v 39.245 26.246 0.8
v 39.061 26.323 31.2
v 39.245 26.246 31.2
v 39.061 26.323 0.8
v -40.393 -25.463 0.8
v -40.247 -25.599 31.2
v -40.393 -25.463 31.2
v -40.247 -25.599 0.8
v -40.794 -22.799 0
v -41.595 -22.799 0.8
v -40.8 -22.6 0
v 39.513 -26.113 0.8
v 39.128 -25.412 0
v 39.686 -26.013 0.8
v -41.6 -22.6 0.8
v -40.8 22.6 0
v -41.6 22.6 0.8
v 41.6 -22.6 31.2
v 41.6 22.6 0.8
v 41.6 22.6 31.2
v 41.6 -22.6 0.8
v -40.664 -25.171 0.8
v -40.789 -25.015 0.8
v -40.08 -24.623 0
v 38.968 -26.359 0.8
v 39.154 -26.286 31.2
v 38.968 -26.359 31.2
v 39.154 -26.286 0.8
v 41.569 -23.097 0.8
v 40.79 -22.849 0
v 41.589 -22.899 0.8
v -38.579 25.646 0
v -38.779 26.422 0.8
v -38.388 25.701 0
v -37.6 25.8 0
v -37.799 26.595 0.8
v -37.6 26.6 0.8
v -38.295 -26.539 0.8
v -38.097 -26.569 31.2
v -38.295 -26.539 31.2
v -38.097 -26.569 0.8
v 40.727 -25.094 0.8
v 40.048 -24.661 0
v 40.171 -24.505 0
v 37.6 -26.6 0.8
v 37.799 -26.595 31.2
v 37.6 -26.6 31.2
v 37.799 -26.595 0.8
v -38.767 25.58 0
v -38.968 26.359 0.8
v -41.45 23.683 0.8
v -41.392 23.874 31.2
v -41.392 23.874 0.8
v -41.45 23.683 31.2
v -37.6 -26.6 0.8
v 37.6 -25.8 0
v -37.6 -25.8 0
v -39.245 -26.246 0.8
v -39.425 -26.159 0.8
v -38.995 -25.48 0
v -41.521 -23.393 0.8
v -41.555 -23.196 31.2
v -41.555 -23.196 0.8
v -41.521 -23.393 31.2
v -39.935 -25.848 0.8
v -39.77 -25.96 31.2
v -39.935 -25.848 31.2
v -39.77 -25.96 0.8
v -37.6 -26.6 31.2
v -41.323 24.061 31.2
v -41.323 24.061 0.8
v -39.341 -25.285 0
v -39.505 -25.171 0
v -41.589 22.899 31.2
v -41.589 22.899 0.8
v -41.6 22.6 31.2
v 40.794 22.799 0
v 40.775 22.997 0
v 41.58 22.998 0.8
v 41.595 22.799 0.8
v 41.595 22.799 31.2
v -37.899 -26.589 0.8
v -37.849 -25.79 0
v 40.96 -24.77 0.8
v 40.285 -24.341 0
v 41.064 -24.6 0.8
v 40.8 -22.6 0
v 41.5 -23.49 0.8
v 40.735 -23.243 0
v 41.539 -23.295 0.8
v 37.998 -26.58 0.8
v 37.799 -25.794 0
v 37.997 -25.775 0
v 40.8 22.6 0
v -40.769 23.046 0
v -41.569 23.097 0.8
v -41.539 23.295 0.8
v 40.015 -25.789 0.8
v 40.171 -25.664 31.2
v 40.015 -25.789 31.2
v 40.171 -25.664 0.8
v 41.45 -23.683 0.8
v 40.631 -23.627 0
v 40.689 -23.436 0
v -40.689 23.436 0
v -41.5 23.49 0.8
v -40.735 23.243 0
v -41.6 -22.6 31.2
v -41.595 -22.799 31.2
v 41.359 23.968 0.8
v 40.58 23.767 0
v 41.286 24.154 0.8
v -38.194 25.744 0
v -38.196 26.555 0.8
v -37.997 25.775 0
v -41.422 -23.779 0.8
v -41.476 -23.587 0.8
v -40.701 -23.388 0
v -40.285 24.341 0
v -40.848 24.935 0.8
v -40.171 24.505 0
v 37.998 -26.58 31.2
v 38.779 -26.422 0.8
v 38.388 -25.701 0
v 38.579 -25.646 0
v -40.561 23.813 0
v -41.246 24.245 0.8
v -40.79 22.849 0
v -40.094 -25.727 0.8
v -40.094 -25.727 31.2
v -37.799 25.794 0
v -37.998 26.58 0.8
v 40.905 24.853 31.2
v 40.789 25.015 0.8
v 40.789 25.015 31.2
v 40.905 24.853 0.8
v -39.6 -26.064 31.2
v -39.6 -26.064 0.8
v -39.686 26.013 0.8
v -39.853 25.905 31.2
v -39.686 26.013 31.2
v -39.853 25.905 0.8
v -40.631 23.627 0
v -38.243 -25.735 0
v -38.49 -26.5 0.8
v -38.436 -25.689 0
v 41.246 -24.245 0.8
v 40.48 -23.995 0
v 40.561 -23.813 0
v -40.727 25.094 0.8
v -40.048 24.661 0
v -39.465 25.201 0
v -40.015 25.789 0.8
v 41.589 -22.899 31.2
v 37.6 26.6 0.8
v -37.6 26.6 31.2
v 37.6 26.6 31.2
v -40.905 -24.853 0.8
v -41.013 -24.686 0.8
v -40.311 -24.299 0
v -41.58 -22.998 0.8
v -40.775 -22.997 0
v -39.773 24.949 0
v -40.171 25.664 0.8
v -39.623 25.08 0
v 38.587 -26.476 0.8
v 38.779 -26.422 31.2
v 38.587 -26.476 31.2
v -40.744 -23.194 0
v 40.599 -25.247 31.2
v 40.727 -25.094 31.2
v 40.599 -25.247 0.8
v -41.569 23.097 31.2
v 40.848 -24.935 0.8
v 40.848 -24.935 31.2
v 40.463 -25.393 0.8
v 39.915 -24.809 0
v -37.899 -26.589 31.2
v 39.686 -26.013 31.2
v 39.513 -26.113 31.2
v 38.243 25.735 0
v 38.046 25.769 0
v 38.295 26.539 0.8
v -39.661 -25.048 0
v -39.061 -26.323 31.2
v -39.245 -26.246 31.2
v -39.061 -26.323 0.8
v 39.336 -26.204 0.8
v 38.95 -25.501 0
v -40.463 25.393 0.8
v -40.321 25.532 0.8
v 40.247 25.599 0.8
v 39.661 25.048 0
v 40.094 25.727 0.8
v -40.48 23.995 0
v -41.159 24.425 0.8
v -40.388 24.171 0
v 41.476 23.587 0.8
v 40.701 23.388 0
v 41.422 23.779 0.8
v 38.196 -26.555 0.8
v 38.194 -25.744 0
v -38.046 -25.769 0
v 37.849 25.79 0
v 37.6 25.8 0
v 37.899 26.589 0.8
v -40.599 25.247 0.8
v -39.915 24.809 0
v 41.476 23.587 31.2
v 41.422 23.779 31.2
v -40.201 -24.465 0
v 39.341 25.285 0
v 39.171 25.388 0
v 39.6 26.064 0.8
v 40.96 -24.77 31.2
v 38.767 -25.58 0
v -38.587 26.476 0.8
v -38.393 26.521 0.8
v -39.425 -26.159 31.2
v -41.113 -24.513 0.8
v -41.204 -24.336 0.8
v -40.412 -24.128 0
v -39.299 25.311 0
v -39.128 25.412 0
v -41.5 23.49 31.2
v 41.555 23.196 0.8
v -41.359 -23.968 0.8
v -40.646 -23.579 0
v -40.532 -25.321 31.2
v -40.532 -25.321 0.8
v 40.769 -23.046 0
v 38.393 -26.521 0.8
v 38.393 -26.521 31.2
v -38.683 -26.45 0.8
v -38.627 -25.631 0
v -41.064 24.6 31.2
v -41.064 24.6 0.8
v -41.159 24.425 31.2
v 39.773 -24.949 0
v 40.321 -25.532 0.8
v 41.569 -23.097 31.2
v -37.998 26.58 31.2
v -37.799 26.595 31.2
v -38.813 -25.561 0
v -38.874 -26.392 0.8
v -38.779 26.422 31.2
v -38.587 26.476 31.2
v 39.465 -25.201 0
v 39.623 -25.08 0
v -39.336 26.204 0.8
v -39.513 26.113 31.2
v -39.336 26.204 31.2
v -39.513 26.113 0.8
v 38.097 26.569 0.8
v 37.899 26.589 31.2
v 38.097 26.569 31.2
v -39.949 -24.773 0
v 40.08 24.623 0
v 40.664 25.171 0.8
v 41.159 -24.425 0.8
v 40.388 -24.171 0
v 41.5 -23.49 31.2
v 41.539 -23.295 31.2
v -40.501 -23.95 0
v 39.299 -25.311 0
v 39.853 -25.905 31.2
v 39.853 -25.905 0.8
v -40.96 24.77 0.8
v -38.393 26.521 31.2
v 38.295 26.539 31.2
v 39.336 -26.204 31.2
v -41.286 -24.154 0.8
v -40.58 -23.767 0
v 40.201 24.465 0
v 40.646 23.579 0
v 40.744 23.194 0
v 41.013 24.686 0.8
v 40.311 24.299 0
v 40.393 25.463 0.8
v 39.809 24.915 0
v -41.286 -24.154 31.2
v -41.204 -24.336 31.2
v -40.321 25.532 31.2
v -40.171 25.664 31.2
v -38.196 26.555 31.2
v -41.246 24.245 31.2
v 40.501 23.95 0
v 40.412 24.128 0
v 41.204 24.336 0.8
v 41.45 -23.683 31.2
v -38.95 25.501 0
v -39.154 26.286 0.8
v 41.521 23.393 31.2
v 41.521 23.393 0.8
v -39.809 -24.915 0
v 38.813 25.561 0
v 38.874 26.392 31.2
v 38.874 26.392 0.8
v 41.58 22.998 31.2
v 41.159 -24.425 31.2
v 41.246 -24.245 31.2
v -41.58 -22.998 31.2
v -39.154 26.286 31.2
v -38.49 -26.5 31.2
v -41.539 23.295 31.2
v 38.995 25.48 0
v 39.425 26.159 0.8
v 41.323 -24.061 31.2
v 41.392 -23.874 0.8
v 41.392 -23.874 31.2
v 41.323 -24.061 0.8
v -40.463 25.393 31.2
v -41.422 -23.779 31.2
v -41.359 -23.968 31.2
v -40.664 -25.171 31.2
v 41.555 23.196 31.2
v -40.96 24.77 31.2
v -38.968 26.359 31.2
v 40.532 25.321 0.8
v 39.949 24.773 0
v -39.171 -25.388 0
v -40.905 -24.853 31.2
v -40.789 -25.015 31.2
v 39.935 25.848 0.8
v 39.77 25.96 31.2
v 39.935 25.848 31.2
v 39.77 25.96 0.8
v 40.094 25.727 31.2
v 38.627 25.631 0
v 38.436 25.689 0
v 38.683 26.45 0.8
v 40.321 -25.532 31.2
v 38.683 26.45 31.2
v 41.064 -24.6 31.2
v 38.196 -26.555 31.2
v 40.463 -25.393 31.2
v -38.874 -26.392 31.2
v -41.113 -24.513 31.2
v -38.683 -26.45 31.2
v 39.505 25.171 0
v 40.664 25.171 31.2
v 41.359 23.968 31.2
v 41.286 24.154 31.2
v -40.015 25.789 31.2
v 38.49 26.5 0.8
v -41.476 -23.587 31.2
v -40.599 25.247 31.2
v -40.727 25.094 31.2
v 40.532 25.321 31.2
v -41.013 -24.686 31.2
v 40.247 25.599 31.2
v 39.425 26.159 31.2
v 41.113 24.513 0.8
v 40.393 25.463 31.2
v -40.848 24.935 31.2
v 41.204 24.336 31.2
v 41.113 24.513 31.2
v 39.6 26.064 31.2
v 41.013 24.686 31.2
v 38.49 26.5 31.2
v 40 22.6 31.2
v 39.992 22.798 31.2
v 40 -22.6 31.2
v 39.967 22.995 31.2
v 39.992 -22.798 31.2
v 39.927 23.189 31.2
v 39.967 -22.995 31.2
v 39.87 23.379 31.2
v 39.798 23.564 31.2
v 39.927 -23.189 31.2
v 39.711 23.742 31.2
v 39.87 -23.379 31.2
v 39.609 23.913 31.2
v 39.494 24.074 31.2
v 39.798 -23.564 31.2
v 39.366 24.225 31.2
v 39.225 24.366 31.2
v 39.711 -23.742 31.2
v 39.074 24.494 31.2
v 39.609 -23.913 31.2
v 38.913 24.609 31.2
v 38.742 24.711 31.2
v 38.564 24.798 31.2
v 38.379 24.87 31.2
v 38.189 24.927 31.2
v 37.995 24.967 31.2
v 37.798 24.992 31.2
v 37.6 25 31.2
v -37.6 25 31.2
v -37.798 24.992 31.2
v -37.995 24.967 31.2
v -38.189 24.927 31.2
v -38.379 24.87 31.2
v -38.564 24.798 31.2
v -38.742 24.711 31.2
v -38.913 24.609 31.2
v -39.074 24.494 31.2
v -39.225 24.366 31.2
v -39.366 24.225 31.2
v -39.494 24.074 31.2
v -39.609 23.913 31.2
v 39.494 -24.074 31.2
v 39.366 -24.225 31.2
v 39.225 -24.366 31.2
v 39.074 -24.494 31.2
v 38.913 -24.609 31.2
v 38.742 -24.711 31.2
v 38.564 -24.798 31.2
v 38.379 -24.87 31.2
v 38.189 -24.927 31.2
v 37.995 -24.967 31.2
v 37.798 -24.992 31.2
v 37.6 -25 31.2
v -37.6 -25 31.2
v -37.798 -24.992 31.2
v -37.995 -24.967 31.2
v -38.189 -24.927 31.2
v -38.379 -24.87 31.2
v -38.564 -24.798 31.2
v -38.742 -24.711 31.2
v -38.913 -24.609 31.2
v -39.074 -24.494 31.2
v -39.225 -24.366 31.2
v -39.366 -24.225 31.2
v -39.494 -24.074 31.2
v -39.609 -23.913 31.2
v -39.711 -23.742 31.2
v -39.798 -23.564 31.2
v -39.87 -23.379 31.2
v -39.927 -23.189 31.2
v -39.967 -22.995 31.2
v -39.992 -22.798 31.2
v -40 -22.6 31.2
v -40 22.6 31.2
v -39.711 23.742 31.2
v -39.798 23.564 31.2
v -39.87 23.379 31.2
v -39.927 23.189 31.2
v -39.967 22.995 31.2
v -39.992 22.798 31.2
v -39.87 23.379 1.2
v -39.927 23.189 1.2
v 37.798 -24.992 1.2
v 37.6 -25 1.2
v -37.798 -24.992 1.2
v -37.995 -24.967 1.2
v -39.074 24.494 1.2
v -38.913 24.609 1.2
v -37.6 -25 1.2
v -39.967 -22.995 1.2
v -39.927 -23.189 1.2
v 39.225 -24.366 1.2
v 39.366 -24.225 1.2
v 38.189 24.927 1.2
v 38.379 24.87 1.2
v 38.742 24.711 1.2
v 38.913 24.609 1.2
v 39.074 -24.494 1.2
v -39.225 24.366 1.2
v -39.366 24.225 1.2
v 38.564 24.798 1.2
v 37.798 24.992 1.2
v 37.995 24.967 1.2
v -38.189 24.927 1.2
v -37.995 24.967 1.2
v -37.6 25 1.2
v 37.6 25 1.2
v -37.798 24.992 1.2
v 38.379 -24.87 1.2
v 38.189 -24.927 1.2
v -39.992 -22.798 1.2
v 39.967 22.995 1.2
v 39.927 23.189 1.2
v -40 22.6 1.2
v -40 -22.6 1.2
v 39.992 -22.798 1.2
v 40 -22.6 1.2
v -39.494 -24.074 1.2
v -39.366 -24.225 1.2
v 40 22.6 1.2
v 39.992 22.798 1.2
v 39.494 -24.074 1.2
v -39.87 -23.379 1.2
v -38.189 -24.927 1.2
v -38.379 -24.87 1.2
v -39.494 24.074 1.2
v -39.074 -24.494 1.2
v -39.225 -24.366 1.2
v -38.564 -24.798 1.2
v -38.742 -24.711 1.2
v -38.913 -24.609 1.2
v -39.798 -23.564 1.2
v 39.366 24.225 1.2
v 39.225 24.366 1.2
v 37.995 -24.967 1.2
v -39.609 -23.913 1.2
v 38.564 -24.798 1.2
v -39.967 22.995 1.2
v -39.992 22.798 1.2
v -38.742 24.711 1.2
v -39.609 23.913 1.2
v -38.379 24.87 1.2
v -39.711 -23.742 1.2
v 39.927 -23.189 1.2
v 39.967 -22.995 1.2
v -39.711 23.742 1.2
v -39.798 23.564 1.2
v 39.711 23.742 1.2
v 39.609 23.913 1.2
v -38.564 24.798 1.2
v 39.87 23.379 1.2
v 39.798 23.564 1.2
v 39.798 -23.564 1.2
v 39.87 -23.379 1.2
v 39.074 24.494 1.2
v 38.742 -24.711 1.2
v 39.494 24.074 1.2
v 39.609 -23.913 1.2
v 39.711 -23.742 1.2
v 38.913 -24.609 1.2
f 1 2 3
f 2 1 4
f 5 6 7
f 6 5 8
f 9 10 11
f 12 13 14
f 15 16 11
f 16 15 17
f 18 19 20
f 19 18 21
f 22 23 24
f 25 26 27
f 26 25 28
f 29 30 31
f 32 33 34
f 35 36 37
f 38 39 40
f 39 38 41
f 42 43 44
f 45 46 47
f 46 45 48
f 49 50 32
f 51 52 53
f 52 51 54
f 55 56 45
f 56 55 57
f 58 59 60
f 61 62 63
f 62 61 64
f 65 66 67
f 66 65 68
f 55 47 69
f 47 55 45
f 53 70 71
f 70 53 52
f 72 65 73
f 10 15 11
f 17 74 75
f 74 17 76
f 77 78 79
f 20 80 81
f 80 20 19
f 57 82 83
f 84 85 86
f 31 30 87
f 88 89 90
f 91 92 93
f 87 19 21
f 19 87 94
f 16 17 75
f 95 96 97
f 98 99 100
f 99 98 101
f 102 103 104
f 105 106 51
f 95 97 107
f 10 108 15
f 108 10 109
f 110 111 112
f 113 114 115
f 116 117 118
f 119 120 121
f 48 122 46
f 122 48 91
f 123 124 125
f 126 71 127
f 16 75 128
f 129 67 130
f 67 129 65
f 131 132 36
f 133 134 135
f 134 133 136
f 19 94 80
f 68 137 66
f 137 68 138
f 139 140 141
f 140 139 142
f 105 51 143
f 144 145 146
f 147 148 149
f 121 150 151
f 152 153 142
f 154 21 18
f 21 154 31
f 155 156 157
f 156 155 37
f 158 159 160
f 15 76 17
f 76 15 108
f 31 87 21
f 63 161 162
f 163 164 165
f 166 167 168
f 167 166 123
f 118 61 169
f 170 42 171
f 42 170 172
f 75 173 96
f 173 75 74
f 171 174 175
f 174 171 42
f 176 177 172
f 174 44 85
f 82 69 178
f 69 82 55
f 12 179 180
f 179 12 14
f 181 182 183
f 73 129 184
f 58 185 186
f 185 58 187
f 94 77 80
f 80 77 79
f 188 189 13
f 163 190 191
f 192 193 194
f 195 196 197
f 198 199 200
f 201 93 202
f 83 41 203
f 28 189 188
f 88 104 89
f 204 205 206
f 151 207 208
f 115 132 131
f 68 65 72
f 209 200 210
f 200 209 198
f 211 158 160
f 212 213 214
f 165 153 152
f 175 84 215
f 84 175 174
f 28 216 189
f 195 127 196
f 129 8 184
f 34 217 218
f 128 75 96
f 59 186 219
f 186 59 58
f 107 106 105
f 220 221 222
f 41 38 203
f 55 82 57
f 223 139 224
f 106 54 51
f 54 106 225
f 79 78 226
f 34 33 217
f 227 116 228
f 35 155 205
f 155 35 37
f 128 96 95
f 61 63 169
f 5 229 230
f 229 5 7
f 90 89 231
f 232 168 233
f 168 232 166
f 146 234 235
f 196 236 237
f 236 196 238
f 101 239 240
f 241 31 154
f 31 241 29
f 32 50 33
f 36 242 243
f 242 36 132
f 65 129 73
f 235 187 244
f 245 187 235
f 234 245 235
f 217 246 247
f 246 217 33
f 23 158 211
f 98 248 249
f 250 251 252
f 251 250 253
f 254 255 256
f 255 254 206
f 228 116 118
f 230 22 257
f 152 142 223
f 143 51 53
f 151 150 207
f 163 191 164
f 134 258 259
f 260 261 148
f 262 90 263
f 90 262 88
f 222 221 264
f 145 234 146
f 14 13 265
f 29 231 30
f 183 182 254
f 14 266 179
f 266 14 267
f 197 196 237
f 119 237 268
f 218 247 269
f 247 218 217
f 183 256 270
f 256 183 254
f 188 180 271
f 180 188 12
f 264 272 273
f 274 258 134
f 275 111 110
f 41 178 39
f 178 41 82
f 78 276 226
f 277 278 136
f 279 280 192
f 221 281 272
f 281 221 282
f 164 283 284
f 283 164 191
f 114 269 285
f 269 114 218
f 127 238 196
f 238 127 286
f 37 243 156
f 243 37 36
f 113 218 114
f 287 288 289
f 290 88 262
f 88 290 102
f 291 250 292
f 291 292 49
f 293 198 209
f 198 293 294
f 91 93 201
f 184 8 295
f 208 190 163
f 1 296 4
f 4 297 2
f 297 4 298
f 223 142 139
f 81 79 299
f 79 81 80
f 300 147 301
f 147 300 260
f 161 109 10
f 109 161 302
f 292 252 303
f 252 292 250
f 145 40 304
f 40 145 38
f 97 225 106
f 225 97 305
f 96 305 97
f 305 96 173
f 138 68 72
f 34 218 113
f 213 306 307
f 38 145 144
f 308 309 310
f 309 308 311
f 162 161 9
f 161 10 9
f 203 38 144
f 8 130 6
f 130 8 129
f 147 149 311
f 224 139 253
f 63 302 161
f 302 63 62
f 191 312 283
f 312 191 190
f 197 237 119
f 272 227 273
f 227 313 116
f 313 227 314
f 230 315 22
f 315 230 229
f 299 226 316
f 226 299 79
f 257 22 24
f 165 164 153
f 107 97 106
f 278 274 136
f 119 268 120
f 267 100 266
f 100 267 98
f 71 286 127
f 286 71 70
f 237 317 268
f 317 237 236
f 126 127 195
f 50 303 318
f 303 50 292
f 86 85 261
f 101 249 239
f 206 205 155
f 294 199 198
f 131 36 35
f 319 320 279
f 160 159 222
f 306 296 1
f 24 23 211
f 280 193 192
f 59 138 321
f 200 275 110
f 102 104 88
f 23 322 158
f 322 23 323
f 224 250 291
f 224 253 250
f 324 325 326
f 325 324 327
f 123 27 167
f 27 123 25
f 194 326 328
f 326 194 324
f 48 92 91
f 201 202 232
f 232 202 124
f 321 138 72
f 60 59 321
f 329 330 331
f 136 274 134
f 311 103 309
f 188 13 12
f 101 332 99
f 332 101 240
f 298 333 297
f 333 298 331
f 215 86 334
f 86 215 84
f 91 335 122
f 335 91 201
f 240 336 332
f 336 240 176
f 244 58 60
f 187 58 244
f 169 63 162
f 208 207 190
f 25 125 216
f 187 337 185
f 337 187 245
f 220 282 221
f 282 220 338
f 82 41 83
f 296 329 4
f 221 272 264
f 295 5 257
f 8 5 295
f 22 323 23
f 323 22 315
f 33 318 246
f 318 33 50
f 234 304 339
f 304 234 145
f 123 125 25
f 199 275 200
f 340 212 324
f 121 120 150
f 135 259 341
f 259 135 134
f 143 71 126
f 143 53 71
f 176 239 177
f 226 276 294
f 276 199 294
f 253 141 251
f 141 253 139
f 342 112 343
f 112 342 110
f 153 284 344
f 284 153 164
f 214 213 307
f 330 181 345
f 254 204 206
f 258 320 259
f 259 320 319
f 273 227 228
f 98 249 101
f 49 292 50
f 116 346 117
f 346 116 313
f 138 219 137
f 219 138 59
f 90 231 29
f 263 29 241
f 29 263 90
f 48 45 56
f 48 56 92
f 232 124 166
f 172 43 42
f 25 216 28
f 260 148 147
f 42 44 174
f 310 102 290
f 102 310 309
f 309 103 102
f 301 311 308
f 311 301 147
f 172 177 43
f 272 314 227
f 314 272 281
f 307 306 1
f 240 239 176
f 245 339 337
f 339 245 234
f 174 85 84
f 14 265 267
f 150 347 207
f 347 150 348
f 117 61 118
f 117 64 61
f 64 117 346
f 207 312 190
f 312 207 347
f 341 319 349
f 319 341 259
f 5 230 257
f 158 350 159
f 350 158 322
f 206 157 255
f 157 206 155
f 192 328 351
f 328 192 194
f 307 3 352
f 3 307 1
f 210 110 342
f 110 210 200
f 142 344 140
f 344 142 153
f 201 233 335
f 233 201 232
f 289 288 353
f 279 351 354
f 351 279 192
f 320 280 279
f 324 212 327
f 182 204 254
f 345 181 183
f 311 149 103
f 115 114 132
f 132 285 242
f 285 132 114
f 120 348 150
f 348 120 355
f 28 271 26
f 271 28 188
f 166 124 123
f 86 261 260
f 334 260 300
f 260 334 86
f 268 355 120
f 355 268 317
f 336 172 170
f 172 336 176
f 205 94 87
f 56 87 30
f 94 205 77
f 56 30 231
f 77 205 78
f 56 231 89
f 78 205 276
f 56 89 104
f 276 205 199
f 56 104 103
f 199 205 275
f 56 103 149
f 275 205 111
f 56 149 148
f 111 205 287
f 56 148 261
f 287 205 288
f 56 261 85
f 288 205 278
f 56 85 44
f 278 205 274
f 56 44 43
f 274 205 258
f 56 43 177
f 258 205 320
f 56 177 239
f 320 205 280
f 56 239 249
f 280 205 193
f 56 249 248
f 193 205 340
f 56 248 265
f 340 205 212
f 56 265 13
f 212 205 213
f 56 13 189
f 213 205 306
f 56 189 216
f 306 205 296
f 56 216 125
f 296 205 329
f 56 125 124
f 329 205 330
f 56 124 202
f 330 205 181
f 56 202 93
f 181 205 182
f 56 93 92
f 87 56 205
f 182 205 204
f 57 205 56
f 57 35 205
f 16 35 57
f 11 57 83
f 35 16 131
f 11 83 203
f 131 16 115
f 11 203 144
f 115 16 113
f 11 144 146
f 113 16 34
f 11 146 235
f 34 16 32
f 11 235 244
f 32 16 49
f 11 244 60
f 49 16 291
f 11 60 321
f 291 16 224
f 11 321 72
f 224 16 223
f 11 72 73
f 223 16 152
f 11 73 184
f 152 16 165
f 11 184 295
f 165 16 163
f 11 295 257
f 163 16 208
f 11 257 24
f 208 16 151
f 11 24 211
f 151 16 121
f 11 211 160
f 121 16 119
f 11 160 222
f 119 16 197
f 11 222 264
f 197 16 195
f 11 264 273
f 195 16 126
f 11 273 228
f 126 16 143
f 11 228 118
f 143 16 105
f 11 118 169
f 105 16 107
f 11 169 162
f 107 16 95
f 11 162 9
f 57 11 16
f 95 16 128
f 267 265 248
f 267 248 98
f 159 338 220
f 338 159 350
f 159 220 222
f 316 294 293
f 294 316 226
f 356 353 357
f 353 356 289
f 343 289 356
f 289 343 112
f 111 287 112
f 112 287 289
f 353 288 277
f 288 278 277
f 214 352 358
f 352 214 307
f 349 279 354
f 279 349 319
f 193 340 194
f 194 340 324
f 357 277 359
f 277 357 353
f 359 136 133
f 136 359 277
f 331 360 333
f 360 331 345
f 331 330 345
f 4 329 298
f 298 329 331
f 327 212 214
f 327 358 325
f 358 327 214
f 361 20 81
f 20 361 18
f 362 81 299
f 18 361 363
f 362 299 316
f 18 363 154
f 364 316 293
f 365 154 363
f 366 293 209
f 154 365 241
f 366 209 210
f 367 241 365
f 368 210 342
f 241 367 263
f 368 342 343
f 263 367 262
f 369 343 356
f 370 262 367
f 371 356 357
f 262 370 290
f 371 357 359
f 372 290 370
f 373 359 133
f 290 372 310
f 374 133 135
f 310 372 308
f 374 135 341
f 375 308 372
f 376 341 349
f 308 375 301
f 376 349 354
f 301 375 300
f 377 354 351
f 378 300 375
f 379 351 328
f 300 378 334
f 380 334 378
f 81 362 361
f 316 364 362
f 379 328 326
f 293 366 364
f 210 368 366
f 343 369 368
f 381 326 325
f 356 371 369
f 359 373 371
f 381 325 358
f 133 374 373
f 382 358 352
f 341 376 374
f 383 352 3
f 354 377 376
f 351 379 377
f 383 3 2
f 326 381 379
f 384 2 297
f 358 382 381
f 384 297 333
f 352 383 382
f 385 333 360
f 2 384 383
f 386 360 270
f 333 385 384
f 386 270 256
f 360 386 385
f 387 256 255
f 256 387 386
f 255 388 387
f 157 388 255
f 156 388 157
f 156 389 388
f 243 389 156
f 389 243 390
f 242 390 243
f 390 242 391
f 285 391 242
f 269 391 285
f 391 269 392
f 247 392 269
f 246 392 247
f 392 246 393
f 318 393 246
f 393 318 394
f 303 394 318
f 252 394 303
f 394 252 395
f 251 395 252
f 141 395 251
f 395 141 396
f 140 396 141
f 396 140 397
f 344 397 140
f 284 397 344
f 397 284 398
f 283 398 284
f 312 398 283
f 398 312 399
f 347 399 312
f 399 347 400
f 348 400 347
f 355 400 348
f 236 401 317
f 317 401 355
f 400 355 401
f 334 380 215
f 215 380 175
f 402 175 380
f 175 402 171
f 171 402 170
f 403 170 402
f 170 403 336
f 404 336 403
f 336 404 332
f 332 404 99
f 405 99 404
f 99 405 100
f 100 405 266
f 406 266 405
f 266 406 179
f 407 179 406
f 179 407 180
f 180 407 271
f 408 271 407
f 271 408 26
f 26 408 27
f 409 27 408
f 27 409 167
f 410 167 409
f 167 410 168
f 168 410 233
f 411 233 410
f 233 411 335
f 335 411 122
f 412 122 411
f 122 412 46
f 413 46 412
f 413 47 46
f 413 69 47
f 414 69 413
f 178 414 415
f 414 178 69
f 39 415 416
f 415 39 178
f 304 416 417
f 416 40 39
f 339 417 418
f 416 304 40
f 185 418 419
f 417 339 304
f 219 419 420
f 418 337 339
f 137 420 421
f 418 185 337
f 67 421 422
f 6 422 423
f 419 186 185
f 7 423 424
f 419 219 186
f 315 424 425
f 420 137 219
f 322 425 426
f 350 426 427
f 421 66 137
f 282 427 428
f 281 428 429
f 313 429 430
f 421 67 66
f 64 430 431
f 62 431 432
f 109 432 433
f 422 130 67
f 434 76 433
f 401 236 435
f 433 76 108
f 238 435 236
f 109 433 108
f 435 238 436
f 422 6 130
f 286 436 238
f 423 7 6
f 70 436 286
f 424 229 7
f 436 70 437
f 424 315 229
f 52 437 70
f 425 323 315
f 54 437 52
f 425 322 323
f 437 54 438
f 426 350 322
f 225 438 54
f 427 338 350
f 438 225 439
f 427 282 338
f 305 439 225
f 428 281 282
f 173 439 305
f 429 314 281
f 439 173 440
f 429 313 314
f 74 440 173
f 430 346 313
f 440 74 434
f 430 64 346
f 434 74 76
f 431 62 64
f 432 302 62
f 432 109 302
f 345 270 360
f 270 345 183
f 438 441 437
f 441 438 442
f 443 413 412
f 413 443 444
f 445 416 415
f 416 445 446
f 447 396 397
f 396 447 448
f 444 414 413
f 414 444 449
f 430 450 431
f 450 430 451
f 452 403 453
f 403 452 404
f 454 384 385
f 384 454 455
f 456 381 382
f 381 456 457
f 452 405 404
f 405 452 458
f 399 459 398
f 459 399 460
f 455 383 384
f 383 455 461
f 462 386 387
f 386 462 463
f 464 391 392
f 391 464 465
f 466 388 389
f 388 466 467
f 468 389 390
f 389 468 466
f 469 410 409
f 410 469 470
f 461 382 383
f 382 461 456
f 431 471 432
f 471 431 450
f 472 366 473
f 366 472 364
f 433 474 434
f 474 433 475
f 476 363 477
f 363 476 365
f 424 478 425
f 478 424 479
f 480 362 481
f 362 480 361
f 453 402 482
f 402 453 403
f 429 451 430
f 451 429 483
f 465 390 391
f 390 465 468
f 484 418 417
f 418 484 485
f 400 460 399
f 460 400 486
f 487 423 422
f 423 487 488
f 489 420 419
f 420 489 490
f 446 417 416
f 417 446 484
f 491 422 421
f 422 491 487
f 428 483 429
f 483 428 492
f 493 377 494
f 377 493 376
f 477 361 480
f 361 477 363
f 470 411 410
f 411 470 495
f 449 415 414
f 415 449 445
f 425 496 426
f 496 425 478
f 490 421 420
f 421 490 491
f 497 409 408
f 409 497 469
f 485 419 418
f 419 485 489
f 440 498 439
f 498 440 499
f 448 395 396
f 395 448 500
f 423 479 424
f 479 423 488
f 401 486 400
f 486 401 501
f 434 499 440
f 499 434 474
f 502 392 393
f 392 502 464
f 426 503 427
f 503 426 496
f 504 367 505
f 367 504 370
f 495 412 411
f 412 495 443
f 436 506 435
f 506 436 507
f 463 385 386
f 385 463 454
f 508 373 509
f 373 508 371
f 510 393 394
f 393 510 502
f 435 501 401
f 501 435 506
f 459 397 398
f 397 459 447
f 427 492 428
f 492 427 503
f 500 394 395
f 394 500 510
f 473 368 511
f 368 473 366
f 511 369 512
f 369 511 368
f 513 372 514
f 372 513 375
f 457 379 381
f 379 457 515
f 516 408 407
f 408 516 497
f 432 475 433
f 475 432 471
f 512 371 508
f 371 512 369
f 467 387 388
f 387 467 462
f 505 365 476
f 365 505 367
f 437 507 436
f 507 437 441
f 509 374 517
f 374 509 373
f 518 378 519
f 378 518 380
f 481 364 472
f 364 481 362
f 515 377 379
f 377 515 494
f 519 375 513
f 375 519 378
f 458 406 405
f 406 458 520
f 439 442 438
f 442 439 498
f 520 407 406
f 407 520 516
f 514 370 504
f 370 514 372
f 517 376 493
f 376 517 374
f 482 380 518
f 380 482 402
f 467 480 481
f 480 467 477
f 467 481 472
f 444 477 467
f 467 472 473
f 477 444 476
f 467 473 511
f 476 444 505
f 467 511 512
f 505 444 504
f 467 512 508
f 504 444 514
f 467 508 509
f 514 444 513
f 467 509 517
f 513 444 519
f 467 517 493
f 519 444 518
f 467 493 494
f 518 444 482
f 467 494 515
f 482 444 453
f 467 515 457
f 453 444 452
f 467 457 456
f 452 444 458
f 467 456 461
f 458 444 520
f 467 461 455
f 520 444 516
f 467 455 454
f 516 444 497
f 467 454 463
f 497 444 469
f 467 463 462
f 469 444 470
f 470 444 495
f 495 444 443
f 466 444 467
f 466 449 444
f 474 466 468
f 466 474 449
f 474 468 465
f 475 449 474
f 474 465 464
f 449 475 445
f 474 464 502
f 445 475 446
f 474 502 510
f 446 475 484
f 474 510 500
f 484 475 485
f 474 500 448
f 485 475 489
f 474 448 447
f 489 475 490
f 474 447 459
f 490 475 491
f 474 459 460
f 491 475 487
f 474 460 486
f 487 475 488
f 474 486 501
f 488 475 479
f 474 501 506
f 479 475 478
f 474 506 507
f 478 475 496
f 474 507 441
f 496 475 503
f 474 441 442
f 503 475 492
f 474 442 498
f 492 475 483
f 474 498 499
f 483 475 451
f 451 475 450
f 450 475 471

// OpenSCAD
// file: ../lib/profiles.scad
// Shared 2D outlines and prisms. Every module takes its dimensions as
// named arguments — nothing in here reads params.scad, because a `use`d
// file's own includes do NOT see the caller's -D overrides. The caller
// (a part file) includes params.scad and passes the numbers in.

eps = 0.01;

// Rounded rectangle, centred. The double offset rounds convex corners.
module rounded_rect(size = [10, 10], r = 1) {
    rr = max(r, 0);
    offset(r = rr) offset(delta = -rr) square(size, center = true);
}

// Rounded prism, z = 0 on the bed, with a 45° chamfer on the bed edge
// (self-supporting, unlike a downward fillet, and it eats elephant foot).
module chamfered_prism(size = [10, 10], r = 1, h = 10, chamfer = 0.8) {
    c = min(chamfer, h / 2);
    hull() {
        linear_extrude(eps) rounded_rect(size = size - [2*c, 2*c], r = r - c);
        translate([0, 0, c]) linear_extrude(h - c) rounded_rect(size = size, r = r);
    }
}

// Self-test: opening this file directly shows a demo; importers see nothing.
if ($preview && $parent_modules == 0) chamfered_prism(size = [40, 25], r = 5, h = 12);
// file: ../params.scad
// <Project name> — one line on what this is and who/what it is for.
// Single source of truth. Units: mm. Measure once, edit this file, `make`.
//
// Frame of reference (every part): z = 0 on the print bed, XY centred.
// Provenance on every real-world number: MEASURED / PLACEHOLDER / UNVERIFIED.

$fa = $preview ? 12 : 2;     // coarse preview, fine render
$fs = $preview ? 2.0 : 0.2;
eps = 0.01;                  // boolean-overlap fudge: every cutter overshoots by this

/* [Printer — EDIT FOR YOUR MACHINE] */
BED_X = 220; BED_Y = 220; BED_Z = 250;   // ⚠ PLACEHOLDER — your build volume
nozzle  = 0.4;
layer_h = 0.2;

/* [Tray interior — MEASURE THESE] */
inner_w = 80;    // ⚠ PLACEHOLDER — the thing that has to fit inside
inner_d = 50;    // ⚠ PLACEHOLDER
inner_h = 30;    // ⚠ PLACEHOLDER
wall    = 1.6;   // 4 perimeters; tune stiffness here first
floor_t = 1.2;   // 6 layers
corner_r = 4;    // vertical-edge radius; the lid derives its own from this
bottom_chamfer = 0.8;   // 45°, absorbs elephant foot so outer dims stay honest

/* [Lid fit — UNVERIFIED, the gauge decides] */
lid_clear = 0.3;   // ⚠ UNVERIFIED per side — `make gauge` sweeps 0.2..0.6
lid_h     = 8;     // skirt height
lid_top_t = 1.2;

/* [Hidden] */
outer_w = inner_w + 2*wall;
outer_d = inner_d + 2*wall;
outer_h = inner_h + floor_t;
lid_inner_w = outer_w + 2*lid_clear;
lid_inner_d = outer_d + 2*lid_clear;
lid_outer_w = lid_inner_w + 2*wall;
lid_outer_d = lid_inner_d + 2*wall;
lid_outer_h = lid_top_t + lid_h;
// main file
// Tray: open-top box. Prints as rendered (floor on the bed), no support.
include <../params.scad>
use <../lib/profiles.scad>

part_h = outer_h;   // -D part_h=15 renders a coupon with the full floor/wall/corner set

assert(outer_w <= BED_X && outer_d <= BED_Y && part_h <= BED_Z,
       str("tray exceeds bed: ", outer_w, " x ", outer_d, " x ", part_h));
assert(wall >= 2*nozzle, "wall thinner than 2 perimeters");
assert(corner_r > wall, "corner_r must exceed wall or the inner corner goes sharp");
echo(str("tray outer: ", outer_w, " x ", outer_d, " x ", part_h,
         "   bed margin: ", BED_X - outer_w, " / ", BED_Y - outer_d));

module tray(h = outer_h) {
    difference() {
        chamfered_prism(size = [outer_w, outer_d], r = corner_r, h = h, chamfer = bottom_chamfer);
        // cavity: starts at the floor, overshoots the top by eps
        translate([0, 0, floor_t])
            linear_extrude(h - floor_t + eps)
                rounded_rect(size = [inner_w, inner_d], r = corner_r - wall);
    }
}

tray(h = part_h);
